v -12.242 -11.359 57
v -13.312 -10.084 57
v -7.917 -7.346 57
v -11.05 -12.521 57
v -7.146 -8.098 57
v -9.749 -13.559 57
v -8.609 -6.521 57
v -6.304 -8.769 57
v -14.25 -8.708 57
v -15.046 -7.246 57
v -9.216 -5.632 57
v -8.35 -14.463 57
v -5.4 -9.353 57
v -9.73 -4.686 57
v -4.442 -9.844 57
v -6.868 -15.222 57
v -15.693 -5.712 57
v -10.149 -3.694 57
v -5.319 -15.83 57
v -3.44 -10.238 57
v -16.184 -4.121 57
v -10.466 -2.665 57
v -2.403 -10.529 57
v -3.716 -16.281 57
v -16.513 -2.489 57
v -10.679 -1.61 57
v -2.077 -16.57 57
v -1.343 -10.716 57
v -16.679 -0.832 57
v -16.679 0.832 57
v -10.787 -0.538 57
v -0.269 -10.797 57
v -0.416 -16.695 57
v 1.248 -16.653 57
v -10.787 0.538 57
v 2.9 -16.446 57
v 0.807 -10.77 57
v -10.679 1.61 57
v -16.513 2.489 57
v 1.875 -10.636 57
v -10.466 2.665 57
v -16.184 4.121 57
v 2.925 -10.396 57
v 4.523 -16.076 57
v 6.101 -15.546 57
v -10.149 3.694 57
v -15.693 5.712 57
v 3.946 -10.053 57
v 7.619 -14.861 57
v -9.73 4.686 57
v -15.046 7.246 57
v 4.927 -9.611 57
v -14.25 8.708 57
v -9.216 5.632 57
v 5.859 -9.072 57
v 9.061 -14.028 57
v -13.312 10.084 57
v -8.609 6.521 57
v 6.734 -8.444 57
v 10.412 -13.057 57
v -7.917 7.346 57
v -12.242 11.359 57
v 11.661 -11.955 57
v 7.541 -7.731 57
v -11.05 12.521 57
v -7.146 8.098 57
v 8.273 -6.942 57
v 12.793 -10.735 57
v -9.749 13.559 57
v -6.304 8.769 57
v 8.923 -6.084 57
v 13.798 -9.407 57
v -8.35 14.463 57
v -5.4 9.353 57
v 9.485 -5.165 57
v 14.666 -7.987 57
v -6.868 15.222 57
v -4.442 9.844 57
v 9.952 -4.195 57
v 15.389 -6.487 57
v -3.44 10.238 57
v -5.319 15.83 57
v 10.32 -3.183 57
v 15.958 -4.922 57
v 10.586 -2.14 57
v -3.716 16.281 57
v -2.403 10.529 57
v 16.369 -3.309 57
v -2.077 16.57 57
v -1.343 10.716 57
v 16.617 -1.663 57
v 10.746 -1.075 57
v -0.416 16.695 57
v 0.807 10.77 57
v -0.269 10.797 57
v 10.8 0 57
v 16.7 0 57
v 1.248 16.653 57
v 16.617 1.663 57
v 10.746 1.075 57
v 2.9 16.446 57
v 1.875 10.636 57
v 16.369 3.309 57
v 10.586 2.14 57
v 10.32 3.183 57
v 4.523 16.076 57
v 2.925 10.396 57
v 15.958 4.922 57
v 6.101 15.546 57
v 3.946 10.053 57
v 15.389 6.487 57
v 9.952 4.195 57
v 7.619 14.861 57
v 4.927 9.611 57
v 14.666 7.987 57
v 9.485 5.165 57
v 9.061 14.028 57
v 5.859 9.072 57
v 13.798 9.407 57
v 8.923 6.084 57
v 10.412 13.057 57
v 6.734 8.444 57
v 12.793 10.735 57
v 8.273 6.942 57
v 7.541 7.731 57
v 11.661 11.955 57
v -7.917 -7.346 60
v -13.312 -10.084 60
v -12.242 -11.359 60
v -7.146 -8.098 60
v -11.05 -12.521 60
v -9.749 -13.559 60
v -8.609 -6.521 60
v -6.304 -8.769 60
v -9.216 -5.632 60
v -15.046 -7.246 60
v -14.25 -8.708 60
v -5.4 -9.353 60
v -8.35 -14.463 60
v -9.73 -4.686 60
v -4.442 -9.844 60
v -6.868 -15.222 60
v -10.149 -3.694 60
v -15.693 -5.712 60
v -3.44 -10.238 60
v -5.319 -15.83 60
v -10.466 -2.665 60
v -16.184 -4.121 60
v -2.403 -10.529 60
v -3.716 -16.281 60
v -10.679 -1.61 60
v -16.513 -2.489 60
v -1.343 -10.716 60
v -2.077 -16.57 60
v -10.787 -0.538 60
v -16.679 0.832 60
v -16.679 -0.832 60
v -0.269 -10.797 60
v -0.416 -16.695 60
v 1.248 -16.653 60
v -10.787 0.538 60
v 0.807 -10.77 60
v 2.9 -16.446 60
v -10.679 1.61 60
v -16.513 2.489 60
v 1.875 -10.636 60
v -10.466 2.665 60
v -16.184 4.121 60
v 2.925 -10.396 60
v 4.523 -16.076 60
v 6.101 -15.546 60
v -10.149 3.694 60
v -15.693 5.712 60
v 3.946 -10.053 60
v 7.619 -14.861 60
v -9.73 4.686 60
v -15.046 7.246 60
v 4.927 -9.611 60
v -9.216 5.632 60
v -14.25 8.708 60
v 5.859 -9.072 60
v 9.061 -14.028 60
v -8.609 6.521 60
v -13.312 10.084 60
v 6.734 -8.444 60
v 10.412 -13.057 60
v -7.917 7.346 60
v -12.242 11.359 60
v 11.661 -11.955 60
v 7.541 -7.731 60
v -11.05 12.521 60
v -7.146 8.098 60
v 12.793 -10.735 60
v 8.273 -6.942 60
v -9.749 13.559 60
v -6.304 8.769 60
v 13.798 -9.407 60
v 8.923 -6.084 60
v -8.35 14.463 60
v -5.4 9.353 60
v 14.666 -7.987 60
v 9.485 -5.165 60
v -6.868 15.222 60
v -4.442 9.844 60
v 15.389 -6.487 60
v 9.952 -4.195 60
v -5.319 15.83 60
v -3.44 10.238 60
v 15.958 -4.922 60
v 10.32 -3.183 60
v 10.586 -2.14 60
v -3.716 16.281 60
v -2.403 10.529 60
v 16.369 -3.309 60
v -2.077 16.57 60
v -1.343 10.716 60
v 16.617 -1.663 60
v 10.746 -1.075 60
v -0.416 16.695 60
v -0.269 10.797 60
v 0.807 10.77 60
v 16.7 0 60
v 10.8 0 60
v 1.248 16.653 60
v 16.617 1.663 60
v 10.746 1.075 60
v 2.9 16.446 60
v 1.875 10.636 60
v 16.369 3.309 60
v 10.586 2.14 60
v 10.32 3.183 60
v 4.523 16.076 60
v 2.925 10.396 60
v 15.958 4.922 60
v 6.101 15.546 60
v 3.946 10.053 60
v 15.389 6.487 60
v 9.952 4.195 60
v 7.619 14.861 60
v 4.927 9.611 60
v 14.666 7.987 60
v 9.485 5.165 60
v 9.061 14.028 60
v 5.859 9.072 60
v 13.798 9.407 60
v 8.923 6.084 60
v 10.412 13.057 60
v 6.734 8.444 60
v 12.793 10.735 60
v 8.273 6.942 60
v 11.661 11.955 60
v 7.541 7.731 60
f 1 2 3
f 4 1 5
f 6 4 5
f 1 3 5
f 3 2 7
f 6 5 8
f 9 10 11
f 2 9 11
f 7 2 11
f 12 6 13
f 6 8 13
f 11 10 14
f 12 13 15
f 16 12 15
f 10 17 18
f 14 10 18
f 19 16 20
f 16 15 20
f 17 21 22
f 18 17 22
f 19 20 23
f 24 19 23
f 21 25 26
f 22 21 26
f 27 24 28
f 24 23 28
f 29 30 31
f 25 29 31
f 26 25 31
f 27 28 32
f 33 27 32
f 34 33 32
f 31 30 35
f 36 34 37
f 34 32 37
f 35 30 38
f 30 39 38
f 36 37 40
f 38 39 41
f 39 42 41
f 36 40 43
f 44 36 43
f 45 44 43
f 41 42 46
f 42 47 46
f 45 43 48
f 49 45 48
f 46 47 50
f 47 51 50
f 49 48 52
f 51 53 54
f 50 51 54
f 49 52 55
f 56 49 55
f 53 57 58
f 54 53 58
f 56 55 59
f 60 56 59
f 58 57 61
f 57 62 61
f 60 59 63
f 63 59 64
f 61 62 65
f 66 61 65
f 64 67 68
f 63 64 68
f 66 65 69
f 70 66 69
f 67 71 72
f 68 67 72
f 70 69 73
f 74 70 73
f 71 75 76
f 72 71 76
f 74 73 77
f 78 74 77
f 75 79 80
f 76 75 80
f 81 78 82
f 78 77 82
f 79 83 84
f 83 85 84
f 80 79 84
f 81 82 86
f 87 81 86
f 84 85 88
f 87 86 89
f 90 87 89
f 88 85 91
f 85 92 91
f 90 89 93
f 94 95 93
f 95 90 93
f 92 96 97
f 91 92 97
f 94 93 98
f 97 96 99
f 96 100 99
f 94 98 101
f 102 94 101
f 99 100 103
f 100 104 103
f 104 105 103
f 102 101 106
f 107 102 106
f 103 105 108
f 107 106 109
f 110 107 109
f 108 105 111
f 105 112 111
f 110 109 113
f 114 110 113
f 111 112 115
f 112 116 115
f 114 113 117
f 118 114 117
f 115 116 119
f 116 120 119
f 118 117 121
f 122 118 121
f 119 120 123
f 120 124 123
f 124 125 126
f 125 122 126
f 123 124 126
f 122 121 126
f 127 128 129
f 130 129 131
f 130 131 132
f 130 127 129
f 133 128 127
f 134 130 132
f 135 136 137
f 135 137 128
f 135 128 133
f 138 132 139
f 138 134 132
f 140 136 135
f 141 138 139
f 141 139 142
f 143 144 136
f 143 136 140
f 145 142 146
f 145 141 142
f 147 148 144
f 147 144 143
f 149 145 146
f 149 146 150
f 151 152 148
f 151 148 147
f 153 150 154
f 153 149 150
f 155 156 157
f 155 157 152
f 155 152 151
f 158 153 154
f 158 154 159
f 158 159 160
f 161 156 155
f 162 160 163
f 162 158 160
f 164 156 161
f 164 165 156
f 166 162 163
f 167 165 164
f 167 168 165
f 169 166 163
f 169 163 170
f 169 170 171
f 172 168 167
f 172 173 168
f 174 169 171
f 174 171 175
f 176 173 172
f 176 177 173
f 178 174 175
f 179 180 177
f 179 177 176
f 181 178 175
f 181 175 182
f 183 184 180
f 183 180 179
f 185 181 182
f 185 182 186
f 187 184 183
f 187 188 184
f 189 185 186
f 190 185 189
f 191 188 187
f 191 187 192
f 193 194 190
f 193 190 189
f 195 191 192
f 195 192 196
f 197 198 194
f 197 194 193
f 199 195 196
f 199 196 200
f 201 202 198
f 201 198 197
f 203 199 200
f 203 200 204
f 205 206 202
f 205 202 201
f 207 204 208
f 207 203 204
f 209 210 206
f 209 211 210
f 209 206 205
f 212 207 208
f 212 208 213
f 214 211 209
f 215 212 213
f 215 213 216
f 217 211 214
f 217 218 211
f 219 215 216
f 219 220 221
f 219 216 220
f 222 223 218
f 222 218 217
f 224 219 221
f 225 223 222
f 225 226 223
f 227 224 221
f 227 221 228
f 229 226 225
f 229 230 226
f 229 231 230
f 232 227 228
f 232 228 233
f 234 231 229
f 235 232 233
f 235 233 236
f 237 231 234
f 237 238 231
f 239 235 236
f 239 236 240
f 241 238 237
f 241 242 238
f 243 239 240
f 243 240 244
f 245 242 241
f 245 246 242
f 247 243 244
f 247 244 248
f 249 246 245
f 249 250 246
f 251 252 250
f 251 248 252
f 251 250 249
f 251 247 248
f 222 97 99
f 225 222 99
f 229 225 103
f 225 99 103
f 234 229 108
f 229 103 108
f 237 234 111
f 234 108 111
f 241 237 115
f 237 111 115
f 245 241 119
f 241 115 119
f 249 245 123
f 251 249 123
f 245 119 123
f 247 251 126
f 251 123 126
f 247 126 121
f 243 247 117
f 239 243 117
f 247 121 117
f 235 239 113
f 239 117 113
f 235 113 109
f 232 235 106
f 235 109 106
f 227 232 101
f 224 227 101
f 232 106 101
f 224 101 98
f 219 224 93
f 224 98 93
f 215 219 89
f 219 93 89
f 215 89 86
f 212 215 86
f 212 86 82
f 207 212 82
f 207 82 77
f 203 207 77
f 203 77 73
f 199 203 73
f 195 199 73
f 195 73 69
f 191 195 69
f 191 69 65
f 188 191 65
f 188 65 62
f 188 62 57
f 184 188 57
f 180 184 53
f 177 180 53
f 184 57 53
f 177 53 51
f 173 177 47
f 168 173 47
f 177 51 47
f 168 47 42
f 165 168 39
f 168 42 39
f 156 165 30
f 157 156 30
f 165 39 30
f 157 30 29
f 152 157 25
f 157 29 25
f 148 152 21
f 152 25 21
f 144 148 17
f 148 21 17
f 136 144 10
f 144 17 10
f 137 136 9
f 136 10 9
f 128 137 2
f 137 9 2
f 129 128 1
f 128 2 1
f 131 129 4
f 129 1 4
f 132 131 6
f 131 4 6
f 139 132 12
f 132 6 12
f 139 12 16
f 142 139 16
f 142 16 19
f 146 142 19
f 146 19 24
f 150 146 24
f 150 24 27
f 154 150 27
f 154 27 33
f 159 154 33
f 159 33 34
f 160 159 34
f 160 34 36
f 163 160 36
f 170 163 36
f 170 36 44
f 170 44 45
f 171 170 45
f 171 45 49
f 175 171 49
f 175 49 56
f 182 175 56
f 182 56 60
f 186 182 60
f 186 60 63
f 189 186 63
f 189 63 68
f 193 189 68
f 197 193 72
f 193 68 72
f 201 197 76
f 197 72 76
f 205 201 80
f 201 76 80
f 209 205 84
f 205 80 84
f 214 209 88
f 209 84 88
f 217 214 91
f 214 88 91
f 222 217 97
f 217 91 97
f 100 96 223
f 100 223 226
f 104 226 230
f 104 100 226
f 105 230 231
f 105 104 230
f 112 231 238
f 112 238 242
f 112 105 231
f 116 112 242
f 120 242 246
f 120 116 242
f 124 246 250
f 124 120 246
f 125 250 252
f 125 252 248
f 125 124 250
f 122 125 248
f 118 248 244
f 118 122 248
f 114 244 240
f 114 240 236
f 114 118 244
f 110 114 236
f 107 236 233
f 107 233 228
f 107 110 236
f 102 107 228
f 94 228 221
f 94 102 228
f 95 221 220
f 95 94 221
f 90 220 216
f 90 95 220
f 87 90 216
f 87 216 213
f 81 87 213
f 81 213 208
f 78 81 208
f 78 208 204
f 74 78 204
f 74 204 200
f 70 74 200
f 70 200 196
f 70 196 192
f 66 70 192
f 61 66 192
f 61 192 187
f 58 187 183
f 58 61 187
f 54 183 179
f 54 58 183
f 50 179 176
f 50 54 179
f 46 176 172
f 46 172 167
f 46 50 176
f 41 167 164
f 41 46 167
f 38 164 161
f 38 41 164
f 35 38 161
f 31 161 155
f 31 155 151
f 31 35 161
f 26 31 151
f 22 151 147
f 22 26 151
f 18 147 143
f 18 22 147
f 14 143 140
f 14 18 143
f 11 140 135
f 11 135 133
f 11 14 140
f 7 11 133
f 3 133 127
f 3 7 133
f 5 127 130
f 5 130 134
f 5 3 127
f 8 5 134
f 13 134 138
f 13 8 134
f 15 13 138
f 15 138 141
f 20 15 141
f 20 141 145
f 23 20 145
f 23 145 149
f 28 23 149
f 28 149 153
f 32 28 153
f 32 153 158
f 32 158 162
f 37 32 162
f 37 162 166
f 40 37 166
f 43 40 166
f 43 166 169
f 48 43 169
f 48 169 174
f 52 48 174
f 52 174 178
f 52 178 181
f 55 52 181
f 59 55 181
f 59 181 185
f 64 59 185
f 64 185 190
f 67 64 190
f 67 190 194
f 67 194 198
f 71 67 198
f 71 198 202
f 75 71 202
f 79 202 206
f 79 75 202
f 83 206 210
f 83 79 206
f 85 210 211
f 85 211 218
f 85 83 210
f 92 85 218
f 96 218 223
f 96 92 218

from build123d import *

# Parameters (mm, degrees)
CYLINDER002_R     = 10.8
CYLINDER002_DEPTH = 3
CYLINDER004_R     = 16.7
CYLINDER004_DEPTH = 3


with BuildPart() as cylinder002:
    # Cylinder002 → Cylinder002 (new body)
    with BuildSketch(Plane.XY.offset(57)):
        Circle(CYLINDER002_R)
    extrude(amount=CYLINDER002_DEPTH)


with BuildPart() as anillo:
    # Cylinder004 → Cylinder004 (new body)
    with BuildSketch(Plane.XY.offset(57)):
        Circle(CYLINDER004_R)
    extrude(amount=CYLINDER004_DEPTH)

    # Cut: cut Cylinder002
    add(cylinder002.part, mode=Mode.SUBTRACT)


solid = anillo.part
